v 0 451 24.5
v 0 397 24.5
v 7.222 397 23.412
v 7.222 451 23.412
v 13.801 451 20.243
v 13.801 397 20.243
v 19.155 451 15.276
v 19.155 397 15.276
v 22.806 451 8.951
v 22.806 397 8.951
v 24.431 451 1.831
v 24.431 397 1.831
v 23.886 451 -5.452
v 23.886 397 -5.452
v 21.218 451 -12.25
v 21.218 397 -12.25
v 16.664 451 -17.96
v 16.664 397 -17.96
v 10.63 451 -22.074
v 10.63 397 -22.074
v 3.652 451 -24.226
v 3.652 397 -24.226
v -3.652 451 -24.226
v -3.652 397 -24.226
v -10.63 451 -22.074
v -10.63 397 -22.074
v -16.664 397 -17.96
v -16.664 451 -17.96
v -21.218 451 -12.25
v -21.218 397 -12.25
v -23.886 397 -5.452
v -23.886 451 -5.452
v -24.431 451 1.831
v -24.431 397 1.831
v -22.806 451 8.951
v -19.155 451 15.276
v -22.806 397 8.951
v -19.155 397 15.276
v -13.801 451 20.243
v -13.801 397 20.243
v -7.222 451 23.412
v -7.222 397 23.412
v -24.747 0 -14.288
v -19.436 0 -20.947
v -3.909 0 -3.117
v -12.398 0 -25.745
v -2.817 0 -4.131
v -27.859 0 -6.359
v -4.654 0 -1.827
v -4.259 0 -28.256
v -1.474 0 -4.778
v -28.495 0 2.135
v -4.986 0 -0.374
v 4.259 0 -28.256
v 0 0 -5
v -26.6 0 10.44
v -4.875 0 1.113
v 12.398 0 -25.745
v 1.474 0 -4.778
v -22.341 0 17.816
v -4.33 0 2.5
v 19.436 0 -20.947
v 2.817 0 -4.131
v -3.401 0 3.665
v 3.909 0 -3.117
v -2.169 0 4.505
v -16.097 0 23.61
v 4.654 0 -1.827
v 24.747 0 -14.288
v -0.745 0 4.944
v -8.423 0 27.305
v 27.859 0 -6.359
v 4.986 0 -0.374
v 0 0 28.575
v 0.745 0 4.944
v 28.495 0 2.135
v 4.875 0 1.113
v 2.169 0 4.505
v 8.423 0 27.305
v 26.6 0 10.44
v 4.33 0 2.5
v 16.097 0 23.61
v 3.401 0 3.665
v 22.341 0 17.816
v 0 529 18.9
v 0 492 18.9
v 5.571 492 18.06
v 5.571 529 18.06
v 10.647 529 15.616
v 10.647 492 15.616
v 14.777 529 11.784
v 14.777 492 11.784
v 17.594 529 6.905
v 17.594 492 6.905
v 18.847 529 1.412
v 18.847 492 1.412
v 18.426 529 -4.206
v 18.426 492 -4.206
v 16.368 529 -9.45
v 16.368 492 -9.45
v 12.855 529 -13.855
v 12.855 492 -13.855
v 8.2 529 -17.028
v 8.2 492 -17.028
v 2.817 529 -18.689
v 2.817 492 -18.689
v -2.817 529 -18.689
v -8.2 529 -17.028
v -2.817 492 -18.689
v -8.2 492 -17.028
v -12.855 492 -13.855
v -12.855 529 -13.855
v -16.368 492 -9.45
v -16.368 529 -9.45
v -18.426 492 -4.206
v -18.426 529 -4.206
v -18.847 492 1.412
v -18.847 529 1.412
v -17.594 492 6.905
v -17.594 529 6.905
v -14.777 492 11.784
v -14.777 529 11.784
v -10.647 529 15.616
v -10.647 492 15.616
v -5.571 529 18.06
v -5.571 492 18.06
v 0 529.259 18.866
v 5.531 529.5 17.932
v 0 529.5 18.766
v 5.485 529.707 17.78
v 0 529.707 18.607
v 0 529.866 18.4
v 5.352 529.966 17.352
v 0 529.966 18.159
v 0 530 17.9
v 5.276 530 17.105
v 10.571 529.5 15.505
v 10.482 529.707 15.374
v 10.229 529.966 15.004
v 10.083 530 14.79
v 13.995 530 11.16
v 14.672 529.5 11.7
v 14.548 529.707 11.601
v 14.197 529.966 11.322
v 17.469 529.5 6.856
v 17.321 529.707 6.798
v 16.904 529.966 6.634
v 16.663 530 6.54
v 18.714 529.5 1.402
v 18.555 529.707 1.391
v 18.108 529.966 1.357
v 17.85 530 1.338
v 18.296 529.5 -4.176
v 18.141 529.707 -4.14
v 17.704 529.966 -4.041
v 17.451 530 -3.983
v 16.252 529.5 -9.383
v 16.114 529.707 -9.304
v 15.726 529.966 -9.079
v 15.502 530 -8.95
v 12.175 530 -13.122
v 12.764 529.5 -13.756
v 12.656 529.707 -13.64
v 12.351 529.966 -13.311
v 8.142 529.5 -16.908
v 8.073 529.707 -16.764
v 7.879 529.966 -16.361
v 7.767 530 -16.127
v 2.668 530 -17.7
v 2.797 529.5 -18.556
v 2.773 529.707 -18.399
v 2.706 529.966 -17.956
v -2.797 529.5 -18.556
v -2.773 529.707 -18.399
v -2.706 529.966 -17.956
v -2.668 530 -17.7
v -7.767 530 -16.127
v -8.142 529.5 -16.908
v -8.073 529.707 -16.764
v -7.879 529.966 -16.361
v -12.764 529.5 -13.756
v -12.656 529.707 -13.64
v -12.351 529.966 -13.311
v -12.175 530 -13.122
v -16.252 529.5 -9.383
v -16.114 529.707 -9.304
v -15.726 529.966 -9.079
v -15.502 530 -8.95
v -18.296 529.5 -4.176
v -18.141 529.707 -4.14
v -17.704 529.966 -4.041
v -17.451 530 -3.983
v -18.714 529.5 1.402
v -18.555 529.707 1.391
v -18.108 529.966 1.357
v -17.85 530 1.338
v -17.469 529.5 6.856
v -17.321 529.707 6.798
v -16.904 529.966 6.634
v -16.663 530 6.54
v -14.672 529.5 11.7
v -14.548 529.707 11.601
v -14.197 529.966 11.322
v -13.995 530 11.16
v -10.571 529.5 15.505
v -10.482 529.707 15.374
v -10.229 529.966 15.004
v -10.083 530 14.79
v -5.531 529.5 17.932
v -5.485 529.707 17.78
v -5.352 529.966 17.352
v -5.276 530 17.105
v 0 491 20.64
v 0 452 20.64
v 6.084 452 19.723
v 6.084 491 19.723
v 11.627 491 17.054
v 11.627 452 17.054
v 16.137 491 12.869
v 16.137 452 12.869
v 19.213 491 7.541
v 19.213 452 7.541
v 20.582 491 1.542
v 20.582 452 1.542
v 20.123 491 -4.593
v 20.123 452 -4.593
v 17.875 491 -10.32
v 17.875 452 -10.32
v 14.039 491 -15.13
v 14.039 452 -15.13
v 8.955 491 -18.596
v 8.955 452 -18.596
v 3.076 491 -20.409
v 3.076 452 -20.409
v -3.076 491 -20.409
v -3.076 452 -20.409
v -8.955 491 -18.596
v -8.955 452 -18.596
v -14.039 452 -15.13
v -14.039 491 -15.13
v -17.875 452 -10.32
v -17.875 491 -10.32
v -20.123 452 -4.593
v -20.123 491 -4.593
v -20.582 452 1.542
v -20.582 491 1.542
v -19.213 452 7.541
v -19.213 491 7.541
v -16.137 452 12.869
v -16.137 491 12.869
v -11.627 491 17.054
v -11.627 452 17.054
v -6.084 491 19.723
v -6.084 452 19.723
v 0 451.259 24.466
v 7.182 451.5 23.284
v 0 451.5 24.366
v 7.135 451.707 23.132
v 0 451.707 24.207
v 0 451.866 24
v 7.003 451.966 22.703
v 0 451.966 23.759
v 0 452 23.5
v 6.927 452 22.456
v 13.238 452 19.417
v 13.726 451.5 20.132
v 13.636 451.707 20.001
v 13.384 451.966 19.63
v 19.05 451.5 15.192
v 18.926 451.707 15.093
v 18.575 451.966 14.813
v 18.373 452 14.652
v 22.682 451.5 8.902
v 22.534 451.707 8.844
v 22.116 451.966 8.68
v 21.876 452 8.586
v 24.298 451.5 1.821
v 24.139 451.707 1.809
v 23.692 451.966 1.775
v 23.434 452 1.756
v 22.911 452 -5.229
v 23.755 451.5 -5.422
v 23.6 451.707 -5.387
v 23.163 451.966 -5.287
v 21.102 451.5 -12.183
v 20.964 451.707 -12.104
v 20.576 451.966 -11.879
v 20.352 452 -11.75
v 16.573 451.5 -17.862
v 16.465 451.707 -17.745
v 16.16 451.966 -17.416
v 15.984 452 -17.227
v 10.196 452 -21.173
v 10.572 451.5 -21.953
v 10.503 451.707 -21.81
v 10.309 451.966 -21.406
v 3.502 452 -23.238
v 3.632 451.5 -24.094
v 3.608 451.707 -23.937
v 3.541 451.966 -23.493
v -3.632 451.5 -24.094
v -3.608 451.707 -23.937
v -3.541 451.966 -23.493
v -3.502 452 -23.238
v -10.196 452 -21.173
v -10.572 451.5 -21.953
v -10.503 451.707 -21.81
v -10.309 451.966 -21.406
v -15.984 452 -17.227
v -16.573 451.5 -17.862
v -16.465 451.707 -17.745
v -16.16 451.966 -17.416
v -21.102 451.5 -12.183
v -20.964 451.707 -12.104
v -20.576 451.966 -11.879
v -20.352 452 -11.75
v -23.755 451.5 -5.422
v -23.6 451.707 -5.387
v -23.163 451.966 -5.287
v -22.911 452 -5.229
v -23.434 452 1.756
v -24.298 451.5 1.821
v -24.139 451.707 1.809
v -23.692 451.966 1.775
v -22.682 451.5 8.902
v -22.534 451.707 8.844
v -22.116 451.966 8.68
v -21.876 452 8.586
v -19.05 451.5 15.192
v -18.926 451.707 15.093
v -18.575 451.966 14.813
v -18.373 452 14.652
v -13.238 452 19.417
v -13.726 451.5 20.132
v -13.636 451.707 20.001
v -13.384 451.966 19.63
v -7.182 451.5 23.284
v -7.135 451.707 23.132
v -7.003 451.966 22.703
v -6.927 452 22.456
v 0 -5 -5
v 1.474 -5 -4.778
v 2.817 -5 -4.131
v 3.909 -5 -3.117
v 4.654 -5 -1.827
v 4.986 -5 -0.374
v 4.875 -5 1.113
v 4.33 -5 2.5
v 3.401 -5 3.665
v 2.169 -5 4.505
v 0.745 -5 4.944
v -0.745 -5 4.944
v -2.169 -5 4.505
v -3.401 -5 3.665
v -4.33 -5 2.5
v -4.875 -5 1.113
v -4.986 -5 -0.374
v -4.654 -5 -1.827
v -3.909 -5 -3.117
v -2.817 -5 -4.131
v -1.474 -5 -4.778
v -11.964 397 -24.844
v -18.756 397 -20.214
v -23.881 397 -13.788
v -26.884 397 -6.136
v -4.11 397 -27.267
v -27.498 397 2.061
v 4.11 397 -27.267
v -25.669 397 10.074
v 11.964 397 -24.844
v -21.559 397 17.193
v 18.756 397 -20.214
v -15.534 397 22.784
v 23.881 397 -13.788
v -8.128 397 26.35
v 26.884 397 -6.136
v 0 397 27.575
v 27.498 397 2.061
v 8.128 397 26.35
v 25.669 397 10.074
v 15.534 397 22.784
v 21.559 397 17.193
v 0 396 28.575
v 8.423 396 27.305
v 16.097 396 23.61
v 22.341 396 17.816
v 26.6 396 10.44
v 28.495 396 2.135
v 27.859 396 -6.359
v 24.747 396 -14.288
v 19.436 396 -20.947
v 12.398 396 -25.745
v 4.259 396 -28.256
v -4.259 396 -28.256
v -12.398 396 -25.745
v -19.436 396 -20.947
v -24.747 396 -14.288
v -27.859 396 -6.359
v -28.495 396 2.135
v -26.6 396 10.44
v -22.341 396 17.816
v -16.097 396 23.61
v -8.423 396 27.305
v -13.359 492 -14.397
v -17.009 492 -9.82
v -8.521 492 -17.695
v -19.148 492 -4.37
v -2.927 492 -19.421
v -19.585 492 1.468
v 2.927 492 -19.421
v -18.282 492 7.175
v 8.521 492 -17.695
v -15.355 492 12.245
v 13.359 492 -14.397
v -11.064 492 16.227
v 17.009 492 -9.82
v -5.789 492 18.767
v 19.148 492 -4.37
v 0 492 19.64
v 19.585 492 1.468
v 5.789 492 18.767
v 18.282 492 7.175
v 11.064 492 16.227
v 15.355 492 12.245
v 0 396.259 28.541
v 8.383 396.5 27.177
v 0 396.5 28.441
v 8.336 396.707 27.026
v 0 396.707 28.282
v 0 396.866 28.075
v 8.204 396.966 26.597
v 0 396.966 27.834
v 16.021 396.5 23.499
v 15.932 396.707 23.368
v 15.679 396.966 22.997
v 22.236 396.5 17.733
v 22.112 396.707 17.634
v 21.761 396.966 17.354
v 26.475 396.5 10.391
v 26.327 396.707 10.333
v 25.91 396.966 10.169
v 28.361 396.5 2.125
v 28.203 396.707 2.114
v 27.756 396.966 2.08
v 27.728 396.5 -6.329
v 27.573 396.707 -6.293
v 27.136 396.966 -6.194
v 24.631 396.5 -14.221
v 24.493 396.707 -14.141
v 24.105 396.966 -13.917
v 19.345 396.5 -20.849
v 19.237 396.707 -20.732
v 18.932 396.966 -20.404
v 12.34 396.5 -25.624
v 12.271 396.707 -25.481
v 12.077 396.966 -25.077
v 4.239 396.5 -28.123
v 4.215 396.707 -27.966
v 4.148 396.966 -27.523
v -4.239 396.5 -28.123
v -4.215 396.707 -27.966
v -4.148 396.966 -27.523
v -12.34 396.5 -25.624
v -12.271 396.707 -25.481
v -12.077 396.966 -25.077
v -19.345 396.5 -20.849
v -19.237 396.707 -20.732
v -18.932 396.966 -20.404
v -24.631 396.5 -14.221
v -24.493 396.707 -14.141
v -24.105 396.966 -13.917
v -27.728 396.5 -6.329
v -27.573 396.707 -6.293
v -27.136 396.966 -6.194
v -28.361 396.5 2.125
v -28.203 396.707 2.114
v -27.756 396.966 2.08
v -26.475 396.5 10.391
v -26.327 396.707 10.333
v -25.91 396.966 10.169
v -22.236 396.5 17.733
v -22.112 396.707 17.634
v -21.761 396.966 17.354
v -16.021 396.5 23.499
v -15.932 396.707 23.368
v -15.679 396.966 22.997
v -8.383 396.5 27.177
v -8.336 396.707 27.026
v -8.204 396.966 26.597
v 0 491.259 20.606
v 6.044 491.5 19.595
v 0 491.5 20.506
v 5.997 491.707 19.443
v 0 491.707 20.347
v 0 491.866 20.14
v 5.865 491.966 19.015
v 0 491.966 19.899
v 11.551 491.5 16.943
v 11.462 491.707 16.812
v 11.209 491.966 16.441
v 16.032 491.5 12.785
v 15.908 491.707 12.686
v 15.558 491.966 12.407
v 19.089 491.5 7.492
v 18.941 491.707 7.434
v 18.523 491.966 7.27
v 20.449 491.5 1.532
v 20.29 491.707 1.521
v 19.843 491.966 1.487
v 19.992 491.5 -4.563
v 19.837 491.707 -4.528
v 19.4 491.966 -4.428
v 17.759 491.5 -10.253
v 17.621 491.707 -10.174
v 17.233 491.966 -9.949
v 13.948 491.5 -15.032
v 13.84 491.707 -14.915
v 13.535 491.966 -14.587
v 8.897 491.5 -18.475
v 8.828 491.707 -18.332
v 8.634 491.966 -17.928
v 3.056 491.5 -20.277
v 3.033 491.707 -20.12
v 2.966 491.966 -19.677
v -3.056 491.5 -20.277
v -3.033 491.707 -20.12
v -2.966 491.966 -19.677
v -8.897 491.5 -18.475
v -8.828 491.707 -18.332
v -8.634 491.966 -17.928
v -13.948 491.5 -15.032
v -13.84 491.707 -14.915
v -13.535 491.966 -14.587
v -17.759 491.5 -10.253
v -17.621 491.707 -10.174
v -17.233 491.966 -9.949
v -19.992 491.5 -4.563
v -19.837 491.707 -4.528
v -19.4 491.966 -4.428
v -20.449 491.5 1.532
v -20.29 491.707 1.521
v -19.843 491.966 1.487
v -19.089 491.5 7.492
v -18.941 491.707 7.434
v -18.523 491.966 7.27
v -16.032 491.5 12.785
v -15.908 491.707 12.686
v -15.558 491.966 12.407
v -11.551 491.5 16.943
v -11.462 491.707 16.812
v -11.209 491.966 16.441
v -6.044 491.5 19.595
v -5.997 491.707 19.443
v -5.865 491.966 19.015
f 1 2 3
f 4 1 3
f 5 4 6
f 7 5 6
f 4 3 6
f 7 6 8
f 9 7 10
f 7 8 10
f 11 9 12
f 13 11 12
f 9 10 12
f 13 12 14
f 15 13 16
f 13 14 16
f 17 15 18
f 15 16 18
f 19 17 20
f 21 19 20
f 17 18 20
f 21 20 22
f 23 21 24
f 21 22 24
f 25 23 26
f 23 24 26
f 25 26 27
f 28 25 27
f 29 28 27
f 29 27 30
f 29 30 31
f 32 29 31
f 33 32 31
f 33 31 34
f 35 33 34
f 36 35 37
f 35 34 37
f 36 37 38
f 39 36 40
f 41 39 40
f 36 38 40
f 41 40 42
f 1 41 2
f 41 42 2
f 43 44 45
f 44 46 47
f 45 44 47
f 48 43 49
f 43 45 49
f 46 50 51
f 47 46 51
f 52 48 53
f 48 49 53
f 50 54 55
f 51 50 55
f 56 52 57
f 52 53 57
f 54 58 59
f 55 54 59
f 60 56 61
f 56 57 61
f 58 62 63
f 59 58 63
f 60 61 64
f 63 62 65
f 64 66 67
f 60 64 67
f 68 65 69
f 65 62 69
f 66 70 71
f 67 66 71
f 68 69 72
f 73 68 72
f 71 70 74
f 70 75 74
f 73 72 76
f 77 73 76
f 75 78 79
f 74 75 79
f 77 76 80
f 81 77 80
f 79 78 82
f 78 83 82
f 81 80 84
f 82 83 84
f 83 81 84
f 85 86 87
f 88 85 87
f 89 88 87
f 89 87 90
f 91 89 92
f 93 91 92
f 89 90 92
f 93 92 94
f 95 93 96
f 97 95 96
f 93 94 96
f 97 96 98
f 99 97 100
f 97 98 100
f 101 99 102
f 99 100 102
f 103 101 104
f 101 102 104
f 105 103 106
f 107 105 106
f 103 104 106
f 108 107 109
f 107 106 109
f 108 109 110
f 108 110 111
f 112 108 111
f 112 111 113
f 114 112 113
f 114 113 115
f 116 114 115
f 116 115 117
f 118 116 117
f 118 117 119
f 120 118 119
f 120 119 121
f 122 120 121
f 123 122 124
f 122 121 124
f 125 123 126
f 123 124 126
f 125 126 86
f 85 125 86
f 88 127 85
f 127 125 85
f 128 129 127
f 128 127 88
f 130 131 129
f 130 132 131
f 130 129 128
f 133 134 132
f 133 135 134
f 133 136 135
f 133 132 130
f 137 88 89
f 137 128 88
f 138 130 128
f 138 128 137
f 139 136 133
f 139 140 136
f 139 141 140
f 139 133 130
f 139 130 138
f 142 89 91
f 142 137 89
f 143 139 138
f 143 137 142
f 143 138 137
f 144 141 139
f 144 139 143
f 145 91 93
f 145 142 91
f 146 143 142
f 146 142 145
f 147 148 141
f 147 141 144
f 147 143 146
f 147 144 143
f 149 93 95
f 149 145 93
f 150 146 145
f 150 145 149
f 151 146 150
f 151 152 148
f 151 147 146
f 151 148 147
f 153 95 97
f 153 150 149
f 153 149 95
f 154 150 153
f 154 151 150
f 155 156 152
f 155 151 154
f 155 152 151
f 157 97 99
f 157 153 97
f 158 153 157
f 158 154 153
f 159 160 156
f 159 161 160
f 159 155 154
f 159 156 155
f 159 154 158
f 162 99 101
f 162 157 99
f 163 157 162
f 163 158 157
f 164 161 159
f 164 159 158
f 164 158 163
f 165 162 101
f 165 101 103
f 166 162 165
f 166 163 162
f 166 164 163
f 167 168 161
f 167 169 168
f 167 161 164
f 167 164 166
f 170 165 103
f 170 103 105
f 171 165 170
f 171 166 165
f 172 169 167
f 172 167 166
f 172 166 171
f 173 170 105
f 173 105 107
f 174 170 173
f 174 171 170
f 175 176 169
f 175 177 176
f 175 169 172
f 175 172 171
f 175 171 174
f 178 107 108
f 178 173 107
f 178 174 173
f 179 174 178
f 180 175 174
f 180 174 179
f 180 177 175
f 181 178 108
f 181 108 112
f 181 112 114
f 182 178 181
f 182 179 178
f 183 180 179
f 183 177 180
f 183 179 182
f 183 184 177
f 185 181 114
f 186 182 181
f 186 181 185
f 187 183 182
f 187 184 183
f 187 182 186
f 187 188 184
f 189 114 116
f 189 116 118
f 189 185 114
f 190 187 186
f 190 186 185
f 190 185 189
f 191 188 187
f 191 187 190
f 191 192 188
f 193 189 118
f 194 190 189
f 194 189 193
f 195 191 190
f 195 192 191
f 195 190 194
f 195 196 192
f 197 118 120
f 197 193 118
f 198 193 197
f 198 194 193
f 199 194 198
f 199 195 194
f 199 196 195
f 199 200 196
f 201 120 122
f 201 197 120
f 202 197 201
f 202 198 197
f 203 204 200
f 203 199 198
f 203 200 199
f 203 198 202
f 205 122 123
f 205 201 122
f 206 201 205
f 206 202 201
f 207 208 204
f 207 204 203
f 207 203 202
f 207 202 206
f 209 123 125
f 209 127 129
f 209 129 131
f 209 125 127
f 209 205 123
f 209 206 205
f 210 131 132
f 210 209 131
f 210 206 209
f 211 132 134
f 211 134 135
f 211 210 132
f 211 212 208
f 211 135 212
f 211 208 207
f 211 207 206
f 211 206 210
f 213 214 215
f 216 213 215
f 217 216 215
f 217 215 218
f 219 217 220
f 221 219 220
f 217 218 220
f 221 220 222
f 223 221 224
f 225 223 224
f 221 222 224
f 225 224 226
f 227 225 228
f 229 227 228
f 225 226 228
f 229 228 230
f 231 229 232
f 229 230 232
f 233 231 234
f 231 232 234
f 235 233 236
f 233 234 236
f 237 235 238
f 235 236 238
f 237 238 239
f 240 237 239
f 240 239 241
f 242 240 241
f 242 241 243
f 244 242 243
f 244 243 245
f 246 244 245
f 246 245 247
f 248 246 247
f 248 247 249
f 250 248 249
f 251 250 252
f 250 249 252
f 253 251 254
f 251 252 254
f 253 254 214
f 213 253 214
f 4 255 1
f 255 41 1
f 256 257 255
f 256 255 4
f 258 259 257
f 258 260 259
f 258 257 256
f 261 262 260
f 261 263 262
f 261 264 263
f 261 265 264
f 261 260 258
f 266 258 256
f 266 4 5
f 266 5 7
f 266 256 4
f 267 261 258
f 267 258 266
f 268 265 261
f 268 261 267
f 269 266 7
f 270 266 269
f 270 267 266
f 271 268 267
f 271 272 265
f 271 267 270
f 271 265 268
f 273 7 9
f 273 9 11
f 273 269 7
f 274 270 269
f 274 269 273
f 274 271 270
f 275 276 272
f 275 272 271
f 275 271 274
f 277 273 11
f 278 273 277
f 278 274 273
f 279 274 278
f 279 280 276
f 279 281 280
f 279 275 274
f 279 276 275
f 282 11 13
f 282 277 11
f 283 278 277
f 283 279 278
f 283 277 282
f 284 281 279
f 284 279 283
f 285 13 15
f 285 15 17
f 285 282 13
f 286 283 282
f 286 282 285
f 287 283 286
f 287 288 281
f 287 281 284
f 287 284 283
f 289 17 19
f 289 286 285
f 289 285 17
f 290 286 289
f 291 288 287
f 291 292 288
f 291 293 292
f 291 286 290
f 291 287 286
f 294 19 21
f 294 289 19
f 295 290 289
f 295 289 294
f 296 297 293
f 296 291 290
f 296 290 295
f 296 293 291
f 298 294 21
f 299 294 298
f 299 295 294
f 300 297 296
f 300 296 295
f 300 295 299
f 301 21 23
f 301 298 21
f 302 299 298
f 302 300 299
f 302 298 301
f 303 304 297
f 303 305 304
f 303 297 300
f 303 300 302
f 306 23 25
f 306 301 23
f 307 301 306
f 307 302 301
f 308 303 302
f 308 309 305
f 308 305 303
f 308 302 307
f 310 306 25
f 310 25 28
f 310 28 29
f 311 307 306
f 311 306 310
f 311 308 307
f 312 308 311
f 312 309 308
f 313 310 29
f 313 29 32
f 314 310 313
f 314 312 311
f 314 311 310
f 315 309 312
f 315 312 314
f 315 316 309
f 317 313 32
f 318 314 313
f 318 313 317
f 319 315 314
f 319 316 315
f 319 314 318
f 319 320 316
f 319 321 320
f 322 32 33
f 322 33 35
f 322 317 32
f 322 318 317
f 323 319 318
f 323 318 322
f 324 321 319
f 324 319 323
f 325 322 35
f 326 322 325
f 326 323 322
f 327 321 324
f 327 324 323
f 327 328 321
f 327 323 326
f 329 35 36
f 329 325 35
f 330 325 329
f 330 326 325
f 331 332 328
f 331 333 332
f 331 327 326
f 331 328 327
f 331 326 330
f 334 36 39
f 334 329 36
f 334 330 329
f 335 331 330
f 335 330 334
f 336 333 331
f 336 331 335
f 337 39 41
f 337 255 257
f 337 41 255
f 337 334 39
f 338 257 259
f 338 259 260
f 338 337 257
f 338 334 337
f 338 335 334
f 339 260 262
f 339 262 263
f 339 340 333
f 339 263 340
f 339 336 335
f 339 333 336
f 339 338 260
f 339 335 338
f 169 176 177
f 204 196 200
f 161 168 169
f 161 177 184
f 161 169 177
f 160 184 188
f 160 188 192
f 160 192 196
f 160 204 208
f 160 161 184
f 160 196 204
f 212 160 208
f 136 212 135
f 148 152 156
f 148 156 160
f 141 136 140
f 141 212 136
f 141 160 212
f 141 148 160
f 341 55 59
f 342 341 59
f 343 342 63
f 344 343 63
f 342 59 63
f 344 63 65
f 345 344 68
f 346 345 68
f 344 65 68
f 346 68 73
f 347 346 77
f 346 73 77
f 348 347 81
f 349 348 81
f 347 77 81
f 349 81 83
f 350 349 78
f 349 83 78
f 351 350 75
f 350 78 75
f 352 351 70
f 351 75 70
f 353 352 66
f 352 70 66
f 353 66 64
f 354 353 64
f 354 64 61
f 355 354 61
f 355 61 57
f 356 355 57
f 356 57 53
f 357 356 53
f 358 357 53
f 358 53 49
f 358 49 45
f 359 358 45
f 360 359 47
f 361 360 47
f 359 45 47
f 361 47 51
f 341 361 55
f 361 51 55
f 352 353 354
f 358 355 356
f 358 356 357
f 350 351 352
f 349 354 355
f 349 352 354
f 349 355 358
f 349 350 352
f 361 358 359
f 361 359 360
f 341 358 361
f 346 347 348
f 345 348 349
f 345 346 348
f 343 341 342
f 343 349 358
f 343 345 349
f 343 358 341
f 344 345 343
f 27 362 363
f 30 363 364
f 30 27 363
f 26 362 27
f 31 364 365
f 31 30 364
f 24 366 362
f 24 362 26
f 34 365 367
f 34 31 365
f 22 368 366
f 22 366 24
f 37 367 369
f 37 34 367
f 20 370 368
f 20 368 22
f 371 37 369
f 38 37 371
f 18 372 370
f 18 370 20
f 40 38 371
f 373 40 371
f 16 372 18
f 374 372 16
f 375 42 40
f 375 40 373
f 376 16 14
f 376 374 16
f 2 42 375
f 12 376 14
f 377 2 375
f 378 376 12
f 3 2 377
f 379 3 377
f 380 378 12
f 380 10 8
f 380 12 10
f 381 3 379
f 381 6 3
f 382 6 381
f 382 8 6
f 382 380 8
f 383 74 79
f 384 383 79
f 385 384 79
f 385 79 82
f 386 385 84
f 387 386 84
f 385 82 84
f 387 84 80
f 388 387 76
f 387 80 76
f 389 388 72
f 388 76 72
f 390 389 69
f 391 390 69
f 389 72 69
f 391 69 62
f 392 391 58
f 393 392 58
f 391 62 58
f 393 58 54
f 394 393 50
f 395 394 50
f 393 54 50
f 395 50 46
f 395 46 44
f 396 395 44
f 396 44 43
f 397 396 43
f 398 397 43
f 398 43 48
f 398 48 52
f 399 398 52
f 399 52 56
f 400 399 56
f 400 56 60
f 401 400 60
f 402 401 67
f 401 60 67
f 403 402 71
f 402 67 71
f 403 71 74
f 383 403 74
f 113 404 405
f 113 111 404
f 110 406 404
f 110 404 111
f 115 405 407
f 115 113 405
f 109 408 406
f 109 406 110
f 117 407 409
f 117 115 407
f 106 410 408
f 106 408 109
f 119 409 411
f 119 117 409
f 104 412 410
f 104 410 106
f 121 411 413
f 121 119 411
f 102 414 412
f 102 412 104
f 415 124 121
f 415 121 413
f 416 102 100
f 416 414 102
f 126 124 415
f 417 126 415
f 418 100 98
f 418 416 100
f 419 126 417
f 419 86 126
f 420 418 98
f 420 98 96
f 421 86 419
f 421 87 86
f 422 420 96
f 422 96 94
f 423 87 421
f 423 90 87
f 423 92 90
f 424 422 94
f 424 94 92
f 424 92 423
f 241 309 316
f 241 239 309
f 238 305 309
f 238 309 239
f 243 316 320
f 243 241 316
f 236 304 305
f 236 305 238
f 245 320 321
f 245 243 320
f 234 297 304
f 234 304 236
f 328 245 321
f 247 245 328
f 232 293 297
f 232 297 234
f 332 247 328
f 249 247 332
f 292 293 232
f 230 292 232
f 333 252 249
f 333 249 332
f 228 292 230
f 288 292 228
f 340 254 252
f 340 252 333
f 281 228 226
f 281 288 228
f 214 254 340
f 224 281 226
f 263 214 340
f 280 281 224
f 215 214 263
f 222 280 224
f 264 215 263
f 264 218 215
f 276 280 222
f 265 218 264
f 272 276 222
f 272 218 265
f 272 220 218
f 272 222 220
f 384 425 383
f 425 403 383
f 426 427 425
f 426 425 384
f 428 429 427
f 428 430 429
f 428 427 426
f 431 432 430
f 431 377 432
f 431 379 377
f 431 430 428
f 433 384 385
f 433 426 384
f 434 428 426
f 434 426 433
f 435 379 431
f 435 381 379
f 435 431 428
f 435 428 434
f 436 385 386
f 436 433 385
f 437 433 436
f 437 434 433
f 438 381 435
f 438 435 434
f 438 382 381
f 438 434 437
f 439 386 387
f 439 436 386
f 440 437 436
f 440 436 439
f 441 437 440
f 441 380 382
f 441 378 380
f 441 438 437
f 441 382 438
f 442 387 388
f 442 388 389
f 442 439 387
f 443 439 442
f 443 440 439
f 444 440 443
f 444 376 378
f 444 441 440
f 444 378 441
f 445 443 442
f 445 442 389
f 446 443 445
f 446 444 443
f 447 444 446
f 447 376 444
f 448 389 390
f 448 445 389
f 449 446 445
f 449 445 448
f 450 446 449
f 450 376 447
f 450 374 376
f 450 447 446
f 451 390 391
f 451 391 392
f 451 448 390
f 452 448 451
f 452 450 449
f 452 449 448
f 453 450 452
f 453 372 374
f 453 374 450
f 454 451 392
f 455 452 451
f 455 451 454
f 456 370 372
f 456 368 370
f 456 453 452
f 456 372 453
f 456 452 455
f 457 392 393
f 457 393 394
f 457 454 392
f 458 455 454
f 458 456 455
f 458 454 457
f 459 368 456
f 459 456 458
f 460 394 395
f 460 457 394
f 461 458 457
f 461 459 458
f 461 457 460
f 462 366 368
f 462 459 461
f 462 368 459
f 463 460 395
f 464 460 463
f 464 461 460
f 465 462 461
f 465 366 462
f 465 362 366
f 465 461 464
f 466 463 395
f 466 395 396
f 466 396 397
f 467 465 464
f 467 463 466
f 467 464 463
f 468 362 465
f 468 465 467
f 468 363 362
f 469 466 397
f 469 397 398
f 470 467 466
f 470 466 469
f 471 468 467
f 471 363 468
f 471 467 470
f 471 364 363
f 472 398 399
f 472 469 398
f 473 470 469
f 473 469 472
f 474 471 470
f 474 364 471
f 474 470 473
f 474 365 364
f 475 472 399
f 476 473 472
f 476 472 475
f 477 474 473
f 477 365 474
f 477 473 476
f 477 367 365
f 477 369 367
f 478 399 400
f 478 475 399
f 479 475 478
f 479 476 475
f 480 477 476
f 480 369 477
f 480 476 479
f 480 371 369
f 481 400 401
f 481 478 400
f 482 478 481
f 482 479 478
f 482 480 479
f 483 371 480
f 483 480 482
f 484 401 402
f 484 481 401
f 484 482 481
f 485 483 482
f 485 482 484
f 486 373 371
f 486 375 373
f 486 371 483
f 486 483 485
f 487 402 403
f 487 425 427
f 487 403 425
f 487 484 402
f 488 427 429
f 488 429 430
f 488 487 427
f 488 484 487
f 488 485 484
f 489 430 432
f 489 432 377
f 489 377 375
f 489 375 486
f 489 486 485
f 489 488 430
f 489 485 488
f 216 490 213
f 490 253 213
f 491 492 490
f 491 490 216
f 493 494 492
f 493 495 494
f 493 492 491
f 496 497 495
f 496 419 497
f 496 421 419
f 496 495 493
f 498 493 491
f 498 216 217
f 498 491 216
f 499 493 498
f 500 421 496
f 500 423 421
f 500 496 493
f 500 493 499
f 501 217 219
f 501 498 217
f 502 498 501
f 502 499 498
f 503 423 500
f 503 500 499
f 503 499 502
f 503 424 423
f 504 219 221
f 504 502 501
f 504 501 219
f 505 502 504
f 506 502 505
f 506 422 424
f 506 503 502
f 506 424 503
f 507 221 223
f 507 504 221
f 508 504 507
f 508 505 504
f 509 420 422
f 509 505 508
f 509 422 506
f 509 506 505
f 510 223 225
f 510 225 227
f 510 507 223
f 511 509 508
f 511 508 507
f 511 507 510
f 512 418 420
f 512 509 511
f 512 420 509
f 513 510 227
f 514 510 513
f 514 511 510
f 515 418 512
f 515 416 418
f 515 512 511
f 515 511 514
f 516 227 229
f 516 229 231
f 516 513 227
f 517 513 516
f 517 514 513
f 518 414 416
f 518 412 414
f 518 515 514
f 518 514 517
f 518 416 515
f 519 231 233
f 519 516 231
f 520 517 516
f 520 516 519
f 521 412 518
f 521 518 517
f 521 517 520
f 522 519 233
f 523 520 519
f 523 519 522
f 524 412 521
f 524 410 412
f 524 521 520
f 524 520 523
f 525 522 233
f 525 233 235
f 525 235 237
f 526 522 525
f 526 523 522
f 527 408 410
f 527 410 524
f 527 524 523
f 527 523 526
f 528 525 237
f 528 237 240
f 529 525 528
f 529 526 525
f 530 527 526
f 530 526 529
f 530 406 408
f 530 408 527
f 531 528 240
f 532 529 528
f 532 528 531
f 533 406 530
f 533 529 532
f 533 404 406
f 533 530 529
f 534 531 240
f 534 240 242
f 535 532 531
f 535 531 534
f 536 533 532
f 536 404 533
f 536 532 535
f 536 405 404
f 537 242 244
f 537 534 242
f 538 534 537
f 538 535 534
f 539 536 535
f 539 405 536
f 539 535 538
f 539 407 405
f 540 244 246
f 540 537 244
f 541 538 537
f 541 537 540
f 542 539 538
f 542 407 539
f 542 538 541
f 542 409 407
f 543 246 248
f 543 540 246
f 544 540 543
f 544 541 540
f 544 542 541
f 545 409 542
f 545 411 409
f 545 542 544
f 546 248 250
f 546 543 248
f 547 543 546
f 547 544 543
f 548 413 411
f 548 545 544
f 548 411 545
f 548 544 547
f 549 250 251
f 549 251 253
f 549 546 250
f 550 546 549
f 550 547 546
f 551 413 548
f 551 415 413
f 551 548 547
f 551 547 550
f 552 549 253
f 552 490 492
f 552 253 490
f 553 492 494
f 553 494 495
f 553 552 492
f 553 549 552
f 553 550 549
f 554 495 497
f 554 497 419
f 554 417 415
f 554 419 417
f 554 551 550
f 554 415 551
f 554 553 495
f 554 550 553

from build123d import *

# Parameters (mm, degrees)
SKETCH1_R           = 28.575
BOSS_EXTRUDE1_DEPTH = 397
SKETCH2_R           = 24.5
BOSS_EXTRUDE2_DEPTH = 55
SKETCH3_R           = 20.64
BOSS_EXTRUDE3_DEPTH = 40
SKETCH4_R           = 18.9
BOSS_EXTRUDE4_DEPTH = 38
FILLET1_R           = 1
SKETCH5_R           = 5
BOSS_EXTRUDE5_DEPTH = 5


with BuildPart() as part:
    # Sketch1 → Boss-Extrude1 (new body)
    with BuildSketch(Plane(origin=(0, 0, 0), x_dir=(1, 0, 0), z_dir=(0, 1, 0))):
        with Locations(Location((0, 0, 0), (0, 0, 270))):
            Circle(SKETCH1_R)
    extrude(amount=BOSS_EXTRUDE1_DEPTH)

    # Sketch2 → Boss-Extrude2 (add)
    with BuildSketch(Plane(origin=(0, 397, 0), x_dir=(1, 0, 0), z_dir=(0, 1, 0))):
        with Locations(Location((0, 0, 0), (0, 0, 270))):
            Circle(SKETCH2_R)
    extrude(amount=BOSS_EXTRUDE2_DEPTH)

    # Sketch3 → Boss-Extrude3 (add)
    with BuildSketch(Plane(origin=(0, 452, 0), x_dir=(1, 0, 0), z_dir=(0, 1, 0))):
        with Locations(Location((0, 0, 0), (0, 0, 270))):
            Circle(SKETCH3_R)
    extrude(amount=BOSS_EXTRUDE3_DEPTH)

    # Sketch4 → Boss-Extrude4 (add)
    with BuildSketch(Plane(origin=(0, 492, 0), x_dir=(1, 0, 0), z_dir=(0, 1, 0))):
        with Locations(Location((0, 0, 0), (0, 0, 270))):
            Circle(SKETCH4_R)
    extrude(amount=BOSS_EXTRUDE4_DEPTH)

    # Fillet1
    fillet1_edges = [part.edges().sort_by_distance(p)[0] for p in [
        (0, 492, -20.64),
        (0, 530, -18.9),
        (0, 397, -28.575),
        (0, 452, -24.5),
    ]]
    fillet(fillet1_edges, radius=FILLET1_R)

    # Sketch5 → Boss-Extrude5 (add)
    with BuildSketch(Plane.XZ):
        with Locations(Location((0, 0, 0), (0, 0, 270))):
            Circle(SKETCH5_R)
    extrude(amount=BOSS_EXTRUDE5_DEPTH)


solid = part.part
